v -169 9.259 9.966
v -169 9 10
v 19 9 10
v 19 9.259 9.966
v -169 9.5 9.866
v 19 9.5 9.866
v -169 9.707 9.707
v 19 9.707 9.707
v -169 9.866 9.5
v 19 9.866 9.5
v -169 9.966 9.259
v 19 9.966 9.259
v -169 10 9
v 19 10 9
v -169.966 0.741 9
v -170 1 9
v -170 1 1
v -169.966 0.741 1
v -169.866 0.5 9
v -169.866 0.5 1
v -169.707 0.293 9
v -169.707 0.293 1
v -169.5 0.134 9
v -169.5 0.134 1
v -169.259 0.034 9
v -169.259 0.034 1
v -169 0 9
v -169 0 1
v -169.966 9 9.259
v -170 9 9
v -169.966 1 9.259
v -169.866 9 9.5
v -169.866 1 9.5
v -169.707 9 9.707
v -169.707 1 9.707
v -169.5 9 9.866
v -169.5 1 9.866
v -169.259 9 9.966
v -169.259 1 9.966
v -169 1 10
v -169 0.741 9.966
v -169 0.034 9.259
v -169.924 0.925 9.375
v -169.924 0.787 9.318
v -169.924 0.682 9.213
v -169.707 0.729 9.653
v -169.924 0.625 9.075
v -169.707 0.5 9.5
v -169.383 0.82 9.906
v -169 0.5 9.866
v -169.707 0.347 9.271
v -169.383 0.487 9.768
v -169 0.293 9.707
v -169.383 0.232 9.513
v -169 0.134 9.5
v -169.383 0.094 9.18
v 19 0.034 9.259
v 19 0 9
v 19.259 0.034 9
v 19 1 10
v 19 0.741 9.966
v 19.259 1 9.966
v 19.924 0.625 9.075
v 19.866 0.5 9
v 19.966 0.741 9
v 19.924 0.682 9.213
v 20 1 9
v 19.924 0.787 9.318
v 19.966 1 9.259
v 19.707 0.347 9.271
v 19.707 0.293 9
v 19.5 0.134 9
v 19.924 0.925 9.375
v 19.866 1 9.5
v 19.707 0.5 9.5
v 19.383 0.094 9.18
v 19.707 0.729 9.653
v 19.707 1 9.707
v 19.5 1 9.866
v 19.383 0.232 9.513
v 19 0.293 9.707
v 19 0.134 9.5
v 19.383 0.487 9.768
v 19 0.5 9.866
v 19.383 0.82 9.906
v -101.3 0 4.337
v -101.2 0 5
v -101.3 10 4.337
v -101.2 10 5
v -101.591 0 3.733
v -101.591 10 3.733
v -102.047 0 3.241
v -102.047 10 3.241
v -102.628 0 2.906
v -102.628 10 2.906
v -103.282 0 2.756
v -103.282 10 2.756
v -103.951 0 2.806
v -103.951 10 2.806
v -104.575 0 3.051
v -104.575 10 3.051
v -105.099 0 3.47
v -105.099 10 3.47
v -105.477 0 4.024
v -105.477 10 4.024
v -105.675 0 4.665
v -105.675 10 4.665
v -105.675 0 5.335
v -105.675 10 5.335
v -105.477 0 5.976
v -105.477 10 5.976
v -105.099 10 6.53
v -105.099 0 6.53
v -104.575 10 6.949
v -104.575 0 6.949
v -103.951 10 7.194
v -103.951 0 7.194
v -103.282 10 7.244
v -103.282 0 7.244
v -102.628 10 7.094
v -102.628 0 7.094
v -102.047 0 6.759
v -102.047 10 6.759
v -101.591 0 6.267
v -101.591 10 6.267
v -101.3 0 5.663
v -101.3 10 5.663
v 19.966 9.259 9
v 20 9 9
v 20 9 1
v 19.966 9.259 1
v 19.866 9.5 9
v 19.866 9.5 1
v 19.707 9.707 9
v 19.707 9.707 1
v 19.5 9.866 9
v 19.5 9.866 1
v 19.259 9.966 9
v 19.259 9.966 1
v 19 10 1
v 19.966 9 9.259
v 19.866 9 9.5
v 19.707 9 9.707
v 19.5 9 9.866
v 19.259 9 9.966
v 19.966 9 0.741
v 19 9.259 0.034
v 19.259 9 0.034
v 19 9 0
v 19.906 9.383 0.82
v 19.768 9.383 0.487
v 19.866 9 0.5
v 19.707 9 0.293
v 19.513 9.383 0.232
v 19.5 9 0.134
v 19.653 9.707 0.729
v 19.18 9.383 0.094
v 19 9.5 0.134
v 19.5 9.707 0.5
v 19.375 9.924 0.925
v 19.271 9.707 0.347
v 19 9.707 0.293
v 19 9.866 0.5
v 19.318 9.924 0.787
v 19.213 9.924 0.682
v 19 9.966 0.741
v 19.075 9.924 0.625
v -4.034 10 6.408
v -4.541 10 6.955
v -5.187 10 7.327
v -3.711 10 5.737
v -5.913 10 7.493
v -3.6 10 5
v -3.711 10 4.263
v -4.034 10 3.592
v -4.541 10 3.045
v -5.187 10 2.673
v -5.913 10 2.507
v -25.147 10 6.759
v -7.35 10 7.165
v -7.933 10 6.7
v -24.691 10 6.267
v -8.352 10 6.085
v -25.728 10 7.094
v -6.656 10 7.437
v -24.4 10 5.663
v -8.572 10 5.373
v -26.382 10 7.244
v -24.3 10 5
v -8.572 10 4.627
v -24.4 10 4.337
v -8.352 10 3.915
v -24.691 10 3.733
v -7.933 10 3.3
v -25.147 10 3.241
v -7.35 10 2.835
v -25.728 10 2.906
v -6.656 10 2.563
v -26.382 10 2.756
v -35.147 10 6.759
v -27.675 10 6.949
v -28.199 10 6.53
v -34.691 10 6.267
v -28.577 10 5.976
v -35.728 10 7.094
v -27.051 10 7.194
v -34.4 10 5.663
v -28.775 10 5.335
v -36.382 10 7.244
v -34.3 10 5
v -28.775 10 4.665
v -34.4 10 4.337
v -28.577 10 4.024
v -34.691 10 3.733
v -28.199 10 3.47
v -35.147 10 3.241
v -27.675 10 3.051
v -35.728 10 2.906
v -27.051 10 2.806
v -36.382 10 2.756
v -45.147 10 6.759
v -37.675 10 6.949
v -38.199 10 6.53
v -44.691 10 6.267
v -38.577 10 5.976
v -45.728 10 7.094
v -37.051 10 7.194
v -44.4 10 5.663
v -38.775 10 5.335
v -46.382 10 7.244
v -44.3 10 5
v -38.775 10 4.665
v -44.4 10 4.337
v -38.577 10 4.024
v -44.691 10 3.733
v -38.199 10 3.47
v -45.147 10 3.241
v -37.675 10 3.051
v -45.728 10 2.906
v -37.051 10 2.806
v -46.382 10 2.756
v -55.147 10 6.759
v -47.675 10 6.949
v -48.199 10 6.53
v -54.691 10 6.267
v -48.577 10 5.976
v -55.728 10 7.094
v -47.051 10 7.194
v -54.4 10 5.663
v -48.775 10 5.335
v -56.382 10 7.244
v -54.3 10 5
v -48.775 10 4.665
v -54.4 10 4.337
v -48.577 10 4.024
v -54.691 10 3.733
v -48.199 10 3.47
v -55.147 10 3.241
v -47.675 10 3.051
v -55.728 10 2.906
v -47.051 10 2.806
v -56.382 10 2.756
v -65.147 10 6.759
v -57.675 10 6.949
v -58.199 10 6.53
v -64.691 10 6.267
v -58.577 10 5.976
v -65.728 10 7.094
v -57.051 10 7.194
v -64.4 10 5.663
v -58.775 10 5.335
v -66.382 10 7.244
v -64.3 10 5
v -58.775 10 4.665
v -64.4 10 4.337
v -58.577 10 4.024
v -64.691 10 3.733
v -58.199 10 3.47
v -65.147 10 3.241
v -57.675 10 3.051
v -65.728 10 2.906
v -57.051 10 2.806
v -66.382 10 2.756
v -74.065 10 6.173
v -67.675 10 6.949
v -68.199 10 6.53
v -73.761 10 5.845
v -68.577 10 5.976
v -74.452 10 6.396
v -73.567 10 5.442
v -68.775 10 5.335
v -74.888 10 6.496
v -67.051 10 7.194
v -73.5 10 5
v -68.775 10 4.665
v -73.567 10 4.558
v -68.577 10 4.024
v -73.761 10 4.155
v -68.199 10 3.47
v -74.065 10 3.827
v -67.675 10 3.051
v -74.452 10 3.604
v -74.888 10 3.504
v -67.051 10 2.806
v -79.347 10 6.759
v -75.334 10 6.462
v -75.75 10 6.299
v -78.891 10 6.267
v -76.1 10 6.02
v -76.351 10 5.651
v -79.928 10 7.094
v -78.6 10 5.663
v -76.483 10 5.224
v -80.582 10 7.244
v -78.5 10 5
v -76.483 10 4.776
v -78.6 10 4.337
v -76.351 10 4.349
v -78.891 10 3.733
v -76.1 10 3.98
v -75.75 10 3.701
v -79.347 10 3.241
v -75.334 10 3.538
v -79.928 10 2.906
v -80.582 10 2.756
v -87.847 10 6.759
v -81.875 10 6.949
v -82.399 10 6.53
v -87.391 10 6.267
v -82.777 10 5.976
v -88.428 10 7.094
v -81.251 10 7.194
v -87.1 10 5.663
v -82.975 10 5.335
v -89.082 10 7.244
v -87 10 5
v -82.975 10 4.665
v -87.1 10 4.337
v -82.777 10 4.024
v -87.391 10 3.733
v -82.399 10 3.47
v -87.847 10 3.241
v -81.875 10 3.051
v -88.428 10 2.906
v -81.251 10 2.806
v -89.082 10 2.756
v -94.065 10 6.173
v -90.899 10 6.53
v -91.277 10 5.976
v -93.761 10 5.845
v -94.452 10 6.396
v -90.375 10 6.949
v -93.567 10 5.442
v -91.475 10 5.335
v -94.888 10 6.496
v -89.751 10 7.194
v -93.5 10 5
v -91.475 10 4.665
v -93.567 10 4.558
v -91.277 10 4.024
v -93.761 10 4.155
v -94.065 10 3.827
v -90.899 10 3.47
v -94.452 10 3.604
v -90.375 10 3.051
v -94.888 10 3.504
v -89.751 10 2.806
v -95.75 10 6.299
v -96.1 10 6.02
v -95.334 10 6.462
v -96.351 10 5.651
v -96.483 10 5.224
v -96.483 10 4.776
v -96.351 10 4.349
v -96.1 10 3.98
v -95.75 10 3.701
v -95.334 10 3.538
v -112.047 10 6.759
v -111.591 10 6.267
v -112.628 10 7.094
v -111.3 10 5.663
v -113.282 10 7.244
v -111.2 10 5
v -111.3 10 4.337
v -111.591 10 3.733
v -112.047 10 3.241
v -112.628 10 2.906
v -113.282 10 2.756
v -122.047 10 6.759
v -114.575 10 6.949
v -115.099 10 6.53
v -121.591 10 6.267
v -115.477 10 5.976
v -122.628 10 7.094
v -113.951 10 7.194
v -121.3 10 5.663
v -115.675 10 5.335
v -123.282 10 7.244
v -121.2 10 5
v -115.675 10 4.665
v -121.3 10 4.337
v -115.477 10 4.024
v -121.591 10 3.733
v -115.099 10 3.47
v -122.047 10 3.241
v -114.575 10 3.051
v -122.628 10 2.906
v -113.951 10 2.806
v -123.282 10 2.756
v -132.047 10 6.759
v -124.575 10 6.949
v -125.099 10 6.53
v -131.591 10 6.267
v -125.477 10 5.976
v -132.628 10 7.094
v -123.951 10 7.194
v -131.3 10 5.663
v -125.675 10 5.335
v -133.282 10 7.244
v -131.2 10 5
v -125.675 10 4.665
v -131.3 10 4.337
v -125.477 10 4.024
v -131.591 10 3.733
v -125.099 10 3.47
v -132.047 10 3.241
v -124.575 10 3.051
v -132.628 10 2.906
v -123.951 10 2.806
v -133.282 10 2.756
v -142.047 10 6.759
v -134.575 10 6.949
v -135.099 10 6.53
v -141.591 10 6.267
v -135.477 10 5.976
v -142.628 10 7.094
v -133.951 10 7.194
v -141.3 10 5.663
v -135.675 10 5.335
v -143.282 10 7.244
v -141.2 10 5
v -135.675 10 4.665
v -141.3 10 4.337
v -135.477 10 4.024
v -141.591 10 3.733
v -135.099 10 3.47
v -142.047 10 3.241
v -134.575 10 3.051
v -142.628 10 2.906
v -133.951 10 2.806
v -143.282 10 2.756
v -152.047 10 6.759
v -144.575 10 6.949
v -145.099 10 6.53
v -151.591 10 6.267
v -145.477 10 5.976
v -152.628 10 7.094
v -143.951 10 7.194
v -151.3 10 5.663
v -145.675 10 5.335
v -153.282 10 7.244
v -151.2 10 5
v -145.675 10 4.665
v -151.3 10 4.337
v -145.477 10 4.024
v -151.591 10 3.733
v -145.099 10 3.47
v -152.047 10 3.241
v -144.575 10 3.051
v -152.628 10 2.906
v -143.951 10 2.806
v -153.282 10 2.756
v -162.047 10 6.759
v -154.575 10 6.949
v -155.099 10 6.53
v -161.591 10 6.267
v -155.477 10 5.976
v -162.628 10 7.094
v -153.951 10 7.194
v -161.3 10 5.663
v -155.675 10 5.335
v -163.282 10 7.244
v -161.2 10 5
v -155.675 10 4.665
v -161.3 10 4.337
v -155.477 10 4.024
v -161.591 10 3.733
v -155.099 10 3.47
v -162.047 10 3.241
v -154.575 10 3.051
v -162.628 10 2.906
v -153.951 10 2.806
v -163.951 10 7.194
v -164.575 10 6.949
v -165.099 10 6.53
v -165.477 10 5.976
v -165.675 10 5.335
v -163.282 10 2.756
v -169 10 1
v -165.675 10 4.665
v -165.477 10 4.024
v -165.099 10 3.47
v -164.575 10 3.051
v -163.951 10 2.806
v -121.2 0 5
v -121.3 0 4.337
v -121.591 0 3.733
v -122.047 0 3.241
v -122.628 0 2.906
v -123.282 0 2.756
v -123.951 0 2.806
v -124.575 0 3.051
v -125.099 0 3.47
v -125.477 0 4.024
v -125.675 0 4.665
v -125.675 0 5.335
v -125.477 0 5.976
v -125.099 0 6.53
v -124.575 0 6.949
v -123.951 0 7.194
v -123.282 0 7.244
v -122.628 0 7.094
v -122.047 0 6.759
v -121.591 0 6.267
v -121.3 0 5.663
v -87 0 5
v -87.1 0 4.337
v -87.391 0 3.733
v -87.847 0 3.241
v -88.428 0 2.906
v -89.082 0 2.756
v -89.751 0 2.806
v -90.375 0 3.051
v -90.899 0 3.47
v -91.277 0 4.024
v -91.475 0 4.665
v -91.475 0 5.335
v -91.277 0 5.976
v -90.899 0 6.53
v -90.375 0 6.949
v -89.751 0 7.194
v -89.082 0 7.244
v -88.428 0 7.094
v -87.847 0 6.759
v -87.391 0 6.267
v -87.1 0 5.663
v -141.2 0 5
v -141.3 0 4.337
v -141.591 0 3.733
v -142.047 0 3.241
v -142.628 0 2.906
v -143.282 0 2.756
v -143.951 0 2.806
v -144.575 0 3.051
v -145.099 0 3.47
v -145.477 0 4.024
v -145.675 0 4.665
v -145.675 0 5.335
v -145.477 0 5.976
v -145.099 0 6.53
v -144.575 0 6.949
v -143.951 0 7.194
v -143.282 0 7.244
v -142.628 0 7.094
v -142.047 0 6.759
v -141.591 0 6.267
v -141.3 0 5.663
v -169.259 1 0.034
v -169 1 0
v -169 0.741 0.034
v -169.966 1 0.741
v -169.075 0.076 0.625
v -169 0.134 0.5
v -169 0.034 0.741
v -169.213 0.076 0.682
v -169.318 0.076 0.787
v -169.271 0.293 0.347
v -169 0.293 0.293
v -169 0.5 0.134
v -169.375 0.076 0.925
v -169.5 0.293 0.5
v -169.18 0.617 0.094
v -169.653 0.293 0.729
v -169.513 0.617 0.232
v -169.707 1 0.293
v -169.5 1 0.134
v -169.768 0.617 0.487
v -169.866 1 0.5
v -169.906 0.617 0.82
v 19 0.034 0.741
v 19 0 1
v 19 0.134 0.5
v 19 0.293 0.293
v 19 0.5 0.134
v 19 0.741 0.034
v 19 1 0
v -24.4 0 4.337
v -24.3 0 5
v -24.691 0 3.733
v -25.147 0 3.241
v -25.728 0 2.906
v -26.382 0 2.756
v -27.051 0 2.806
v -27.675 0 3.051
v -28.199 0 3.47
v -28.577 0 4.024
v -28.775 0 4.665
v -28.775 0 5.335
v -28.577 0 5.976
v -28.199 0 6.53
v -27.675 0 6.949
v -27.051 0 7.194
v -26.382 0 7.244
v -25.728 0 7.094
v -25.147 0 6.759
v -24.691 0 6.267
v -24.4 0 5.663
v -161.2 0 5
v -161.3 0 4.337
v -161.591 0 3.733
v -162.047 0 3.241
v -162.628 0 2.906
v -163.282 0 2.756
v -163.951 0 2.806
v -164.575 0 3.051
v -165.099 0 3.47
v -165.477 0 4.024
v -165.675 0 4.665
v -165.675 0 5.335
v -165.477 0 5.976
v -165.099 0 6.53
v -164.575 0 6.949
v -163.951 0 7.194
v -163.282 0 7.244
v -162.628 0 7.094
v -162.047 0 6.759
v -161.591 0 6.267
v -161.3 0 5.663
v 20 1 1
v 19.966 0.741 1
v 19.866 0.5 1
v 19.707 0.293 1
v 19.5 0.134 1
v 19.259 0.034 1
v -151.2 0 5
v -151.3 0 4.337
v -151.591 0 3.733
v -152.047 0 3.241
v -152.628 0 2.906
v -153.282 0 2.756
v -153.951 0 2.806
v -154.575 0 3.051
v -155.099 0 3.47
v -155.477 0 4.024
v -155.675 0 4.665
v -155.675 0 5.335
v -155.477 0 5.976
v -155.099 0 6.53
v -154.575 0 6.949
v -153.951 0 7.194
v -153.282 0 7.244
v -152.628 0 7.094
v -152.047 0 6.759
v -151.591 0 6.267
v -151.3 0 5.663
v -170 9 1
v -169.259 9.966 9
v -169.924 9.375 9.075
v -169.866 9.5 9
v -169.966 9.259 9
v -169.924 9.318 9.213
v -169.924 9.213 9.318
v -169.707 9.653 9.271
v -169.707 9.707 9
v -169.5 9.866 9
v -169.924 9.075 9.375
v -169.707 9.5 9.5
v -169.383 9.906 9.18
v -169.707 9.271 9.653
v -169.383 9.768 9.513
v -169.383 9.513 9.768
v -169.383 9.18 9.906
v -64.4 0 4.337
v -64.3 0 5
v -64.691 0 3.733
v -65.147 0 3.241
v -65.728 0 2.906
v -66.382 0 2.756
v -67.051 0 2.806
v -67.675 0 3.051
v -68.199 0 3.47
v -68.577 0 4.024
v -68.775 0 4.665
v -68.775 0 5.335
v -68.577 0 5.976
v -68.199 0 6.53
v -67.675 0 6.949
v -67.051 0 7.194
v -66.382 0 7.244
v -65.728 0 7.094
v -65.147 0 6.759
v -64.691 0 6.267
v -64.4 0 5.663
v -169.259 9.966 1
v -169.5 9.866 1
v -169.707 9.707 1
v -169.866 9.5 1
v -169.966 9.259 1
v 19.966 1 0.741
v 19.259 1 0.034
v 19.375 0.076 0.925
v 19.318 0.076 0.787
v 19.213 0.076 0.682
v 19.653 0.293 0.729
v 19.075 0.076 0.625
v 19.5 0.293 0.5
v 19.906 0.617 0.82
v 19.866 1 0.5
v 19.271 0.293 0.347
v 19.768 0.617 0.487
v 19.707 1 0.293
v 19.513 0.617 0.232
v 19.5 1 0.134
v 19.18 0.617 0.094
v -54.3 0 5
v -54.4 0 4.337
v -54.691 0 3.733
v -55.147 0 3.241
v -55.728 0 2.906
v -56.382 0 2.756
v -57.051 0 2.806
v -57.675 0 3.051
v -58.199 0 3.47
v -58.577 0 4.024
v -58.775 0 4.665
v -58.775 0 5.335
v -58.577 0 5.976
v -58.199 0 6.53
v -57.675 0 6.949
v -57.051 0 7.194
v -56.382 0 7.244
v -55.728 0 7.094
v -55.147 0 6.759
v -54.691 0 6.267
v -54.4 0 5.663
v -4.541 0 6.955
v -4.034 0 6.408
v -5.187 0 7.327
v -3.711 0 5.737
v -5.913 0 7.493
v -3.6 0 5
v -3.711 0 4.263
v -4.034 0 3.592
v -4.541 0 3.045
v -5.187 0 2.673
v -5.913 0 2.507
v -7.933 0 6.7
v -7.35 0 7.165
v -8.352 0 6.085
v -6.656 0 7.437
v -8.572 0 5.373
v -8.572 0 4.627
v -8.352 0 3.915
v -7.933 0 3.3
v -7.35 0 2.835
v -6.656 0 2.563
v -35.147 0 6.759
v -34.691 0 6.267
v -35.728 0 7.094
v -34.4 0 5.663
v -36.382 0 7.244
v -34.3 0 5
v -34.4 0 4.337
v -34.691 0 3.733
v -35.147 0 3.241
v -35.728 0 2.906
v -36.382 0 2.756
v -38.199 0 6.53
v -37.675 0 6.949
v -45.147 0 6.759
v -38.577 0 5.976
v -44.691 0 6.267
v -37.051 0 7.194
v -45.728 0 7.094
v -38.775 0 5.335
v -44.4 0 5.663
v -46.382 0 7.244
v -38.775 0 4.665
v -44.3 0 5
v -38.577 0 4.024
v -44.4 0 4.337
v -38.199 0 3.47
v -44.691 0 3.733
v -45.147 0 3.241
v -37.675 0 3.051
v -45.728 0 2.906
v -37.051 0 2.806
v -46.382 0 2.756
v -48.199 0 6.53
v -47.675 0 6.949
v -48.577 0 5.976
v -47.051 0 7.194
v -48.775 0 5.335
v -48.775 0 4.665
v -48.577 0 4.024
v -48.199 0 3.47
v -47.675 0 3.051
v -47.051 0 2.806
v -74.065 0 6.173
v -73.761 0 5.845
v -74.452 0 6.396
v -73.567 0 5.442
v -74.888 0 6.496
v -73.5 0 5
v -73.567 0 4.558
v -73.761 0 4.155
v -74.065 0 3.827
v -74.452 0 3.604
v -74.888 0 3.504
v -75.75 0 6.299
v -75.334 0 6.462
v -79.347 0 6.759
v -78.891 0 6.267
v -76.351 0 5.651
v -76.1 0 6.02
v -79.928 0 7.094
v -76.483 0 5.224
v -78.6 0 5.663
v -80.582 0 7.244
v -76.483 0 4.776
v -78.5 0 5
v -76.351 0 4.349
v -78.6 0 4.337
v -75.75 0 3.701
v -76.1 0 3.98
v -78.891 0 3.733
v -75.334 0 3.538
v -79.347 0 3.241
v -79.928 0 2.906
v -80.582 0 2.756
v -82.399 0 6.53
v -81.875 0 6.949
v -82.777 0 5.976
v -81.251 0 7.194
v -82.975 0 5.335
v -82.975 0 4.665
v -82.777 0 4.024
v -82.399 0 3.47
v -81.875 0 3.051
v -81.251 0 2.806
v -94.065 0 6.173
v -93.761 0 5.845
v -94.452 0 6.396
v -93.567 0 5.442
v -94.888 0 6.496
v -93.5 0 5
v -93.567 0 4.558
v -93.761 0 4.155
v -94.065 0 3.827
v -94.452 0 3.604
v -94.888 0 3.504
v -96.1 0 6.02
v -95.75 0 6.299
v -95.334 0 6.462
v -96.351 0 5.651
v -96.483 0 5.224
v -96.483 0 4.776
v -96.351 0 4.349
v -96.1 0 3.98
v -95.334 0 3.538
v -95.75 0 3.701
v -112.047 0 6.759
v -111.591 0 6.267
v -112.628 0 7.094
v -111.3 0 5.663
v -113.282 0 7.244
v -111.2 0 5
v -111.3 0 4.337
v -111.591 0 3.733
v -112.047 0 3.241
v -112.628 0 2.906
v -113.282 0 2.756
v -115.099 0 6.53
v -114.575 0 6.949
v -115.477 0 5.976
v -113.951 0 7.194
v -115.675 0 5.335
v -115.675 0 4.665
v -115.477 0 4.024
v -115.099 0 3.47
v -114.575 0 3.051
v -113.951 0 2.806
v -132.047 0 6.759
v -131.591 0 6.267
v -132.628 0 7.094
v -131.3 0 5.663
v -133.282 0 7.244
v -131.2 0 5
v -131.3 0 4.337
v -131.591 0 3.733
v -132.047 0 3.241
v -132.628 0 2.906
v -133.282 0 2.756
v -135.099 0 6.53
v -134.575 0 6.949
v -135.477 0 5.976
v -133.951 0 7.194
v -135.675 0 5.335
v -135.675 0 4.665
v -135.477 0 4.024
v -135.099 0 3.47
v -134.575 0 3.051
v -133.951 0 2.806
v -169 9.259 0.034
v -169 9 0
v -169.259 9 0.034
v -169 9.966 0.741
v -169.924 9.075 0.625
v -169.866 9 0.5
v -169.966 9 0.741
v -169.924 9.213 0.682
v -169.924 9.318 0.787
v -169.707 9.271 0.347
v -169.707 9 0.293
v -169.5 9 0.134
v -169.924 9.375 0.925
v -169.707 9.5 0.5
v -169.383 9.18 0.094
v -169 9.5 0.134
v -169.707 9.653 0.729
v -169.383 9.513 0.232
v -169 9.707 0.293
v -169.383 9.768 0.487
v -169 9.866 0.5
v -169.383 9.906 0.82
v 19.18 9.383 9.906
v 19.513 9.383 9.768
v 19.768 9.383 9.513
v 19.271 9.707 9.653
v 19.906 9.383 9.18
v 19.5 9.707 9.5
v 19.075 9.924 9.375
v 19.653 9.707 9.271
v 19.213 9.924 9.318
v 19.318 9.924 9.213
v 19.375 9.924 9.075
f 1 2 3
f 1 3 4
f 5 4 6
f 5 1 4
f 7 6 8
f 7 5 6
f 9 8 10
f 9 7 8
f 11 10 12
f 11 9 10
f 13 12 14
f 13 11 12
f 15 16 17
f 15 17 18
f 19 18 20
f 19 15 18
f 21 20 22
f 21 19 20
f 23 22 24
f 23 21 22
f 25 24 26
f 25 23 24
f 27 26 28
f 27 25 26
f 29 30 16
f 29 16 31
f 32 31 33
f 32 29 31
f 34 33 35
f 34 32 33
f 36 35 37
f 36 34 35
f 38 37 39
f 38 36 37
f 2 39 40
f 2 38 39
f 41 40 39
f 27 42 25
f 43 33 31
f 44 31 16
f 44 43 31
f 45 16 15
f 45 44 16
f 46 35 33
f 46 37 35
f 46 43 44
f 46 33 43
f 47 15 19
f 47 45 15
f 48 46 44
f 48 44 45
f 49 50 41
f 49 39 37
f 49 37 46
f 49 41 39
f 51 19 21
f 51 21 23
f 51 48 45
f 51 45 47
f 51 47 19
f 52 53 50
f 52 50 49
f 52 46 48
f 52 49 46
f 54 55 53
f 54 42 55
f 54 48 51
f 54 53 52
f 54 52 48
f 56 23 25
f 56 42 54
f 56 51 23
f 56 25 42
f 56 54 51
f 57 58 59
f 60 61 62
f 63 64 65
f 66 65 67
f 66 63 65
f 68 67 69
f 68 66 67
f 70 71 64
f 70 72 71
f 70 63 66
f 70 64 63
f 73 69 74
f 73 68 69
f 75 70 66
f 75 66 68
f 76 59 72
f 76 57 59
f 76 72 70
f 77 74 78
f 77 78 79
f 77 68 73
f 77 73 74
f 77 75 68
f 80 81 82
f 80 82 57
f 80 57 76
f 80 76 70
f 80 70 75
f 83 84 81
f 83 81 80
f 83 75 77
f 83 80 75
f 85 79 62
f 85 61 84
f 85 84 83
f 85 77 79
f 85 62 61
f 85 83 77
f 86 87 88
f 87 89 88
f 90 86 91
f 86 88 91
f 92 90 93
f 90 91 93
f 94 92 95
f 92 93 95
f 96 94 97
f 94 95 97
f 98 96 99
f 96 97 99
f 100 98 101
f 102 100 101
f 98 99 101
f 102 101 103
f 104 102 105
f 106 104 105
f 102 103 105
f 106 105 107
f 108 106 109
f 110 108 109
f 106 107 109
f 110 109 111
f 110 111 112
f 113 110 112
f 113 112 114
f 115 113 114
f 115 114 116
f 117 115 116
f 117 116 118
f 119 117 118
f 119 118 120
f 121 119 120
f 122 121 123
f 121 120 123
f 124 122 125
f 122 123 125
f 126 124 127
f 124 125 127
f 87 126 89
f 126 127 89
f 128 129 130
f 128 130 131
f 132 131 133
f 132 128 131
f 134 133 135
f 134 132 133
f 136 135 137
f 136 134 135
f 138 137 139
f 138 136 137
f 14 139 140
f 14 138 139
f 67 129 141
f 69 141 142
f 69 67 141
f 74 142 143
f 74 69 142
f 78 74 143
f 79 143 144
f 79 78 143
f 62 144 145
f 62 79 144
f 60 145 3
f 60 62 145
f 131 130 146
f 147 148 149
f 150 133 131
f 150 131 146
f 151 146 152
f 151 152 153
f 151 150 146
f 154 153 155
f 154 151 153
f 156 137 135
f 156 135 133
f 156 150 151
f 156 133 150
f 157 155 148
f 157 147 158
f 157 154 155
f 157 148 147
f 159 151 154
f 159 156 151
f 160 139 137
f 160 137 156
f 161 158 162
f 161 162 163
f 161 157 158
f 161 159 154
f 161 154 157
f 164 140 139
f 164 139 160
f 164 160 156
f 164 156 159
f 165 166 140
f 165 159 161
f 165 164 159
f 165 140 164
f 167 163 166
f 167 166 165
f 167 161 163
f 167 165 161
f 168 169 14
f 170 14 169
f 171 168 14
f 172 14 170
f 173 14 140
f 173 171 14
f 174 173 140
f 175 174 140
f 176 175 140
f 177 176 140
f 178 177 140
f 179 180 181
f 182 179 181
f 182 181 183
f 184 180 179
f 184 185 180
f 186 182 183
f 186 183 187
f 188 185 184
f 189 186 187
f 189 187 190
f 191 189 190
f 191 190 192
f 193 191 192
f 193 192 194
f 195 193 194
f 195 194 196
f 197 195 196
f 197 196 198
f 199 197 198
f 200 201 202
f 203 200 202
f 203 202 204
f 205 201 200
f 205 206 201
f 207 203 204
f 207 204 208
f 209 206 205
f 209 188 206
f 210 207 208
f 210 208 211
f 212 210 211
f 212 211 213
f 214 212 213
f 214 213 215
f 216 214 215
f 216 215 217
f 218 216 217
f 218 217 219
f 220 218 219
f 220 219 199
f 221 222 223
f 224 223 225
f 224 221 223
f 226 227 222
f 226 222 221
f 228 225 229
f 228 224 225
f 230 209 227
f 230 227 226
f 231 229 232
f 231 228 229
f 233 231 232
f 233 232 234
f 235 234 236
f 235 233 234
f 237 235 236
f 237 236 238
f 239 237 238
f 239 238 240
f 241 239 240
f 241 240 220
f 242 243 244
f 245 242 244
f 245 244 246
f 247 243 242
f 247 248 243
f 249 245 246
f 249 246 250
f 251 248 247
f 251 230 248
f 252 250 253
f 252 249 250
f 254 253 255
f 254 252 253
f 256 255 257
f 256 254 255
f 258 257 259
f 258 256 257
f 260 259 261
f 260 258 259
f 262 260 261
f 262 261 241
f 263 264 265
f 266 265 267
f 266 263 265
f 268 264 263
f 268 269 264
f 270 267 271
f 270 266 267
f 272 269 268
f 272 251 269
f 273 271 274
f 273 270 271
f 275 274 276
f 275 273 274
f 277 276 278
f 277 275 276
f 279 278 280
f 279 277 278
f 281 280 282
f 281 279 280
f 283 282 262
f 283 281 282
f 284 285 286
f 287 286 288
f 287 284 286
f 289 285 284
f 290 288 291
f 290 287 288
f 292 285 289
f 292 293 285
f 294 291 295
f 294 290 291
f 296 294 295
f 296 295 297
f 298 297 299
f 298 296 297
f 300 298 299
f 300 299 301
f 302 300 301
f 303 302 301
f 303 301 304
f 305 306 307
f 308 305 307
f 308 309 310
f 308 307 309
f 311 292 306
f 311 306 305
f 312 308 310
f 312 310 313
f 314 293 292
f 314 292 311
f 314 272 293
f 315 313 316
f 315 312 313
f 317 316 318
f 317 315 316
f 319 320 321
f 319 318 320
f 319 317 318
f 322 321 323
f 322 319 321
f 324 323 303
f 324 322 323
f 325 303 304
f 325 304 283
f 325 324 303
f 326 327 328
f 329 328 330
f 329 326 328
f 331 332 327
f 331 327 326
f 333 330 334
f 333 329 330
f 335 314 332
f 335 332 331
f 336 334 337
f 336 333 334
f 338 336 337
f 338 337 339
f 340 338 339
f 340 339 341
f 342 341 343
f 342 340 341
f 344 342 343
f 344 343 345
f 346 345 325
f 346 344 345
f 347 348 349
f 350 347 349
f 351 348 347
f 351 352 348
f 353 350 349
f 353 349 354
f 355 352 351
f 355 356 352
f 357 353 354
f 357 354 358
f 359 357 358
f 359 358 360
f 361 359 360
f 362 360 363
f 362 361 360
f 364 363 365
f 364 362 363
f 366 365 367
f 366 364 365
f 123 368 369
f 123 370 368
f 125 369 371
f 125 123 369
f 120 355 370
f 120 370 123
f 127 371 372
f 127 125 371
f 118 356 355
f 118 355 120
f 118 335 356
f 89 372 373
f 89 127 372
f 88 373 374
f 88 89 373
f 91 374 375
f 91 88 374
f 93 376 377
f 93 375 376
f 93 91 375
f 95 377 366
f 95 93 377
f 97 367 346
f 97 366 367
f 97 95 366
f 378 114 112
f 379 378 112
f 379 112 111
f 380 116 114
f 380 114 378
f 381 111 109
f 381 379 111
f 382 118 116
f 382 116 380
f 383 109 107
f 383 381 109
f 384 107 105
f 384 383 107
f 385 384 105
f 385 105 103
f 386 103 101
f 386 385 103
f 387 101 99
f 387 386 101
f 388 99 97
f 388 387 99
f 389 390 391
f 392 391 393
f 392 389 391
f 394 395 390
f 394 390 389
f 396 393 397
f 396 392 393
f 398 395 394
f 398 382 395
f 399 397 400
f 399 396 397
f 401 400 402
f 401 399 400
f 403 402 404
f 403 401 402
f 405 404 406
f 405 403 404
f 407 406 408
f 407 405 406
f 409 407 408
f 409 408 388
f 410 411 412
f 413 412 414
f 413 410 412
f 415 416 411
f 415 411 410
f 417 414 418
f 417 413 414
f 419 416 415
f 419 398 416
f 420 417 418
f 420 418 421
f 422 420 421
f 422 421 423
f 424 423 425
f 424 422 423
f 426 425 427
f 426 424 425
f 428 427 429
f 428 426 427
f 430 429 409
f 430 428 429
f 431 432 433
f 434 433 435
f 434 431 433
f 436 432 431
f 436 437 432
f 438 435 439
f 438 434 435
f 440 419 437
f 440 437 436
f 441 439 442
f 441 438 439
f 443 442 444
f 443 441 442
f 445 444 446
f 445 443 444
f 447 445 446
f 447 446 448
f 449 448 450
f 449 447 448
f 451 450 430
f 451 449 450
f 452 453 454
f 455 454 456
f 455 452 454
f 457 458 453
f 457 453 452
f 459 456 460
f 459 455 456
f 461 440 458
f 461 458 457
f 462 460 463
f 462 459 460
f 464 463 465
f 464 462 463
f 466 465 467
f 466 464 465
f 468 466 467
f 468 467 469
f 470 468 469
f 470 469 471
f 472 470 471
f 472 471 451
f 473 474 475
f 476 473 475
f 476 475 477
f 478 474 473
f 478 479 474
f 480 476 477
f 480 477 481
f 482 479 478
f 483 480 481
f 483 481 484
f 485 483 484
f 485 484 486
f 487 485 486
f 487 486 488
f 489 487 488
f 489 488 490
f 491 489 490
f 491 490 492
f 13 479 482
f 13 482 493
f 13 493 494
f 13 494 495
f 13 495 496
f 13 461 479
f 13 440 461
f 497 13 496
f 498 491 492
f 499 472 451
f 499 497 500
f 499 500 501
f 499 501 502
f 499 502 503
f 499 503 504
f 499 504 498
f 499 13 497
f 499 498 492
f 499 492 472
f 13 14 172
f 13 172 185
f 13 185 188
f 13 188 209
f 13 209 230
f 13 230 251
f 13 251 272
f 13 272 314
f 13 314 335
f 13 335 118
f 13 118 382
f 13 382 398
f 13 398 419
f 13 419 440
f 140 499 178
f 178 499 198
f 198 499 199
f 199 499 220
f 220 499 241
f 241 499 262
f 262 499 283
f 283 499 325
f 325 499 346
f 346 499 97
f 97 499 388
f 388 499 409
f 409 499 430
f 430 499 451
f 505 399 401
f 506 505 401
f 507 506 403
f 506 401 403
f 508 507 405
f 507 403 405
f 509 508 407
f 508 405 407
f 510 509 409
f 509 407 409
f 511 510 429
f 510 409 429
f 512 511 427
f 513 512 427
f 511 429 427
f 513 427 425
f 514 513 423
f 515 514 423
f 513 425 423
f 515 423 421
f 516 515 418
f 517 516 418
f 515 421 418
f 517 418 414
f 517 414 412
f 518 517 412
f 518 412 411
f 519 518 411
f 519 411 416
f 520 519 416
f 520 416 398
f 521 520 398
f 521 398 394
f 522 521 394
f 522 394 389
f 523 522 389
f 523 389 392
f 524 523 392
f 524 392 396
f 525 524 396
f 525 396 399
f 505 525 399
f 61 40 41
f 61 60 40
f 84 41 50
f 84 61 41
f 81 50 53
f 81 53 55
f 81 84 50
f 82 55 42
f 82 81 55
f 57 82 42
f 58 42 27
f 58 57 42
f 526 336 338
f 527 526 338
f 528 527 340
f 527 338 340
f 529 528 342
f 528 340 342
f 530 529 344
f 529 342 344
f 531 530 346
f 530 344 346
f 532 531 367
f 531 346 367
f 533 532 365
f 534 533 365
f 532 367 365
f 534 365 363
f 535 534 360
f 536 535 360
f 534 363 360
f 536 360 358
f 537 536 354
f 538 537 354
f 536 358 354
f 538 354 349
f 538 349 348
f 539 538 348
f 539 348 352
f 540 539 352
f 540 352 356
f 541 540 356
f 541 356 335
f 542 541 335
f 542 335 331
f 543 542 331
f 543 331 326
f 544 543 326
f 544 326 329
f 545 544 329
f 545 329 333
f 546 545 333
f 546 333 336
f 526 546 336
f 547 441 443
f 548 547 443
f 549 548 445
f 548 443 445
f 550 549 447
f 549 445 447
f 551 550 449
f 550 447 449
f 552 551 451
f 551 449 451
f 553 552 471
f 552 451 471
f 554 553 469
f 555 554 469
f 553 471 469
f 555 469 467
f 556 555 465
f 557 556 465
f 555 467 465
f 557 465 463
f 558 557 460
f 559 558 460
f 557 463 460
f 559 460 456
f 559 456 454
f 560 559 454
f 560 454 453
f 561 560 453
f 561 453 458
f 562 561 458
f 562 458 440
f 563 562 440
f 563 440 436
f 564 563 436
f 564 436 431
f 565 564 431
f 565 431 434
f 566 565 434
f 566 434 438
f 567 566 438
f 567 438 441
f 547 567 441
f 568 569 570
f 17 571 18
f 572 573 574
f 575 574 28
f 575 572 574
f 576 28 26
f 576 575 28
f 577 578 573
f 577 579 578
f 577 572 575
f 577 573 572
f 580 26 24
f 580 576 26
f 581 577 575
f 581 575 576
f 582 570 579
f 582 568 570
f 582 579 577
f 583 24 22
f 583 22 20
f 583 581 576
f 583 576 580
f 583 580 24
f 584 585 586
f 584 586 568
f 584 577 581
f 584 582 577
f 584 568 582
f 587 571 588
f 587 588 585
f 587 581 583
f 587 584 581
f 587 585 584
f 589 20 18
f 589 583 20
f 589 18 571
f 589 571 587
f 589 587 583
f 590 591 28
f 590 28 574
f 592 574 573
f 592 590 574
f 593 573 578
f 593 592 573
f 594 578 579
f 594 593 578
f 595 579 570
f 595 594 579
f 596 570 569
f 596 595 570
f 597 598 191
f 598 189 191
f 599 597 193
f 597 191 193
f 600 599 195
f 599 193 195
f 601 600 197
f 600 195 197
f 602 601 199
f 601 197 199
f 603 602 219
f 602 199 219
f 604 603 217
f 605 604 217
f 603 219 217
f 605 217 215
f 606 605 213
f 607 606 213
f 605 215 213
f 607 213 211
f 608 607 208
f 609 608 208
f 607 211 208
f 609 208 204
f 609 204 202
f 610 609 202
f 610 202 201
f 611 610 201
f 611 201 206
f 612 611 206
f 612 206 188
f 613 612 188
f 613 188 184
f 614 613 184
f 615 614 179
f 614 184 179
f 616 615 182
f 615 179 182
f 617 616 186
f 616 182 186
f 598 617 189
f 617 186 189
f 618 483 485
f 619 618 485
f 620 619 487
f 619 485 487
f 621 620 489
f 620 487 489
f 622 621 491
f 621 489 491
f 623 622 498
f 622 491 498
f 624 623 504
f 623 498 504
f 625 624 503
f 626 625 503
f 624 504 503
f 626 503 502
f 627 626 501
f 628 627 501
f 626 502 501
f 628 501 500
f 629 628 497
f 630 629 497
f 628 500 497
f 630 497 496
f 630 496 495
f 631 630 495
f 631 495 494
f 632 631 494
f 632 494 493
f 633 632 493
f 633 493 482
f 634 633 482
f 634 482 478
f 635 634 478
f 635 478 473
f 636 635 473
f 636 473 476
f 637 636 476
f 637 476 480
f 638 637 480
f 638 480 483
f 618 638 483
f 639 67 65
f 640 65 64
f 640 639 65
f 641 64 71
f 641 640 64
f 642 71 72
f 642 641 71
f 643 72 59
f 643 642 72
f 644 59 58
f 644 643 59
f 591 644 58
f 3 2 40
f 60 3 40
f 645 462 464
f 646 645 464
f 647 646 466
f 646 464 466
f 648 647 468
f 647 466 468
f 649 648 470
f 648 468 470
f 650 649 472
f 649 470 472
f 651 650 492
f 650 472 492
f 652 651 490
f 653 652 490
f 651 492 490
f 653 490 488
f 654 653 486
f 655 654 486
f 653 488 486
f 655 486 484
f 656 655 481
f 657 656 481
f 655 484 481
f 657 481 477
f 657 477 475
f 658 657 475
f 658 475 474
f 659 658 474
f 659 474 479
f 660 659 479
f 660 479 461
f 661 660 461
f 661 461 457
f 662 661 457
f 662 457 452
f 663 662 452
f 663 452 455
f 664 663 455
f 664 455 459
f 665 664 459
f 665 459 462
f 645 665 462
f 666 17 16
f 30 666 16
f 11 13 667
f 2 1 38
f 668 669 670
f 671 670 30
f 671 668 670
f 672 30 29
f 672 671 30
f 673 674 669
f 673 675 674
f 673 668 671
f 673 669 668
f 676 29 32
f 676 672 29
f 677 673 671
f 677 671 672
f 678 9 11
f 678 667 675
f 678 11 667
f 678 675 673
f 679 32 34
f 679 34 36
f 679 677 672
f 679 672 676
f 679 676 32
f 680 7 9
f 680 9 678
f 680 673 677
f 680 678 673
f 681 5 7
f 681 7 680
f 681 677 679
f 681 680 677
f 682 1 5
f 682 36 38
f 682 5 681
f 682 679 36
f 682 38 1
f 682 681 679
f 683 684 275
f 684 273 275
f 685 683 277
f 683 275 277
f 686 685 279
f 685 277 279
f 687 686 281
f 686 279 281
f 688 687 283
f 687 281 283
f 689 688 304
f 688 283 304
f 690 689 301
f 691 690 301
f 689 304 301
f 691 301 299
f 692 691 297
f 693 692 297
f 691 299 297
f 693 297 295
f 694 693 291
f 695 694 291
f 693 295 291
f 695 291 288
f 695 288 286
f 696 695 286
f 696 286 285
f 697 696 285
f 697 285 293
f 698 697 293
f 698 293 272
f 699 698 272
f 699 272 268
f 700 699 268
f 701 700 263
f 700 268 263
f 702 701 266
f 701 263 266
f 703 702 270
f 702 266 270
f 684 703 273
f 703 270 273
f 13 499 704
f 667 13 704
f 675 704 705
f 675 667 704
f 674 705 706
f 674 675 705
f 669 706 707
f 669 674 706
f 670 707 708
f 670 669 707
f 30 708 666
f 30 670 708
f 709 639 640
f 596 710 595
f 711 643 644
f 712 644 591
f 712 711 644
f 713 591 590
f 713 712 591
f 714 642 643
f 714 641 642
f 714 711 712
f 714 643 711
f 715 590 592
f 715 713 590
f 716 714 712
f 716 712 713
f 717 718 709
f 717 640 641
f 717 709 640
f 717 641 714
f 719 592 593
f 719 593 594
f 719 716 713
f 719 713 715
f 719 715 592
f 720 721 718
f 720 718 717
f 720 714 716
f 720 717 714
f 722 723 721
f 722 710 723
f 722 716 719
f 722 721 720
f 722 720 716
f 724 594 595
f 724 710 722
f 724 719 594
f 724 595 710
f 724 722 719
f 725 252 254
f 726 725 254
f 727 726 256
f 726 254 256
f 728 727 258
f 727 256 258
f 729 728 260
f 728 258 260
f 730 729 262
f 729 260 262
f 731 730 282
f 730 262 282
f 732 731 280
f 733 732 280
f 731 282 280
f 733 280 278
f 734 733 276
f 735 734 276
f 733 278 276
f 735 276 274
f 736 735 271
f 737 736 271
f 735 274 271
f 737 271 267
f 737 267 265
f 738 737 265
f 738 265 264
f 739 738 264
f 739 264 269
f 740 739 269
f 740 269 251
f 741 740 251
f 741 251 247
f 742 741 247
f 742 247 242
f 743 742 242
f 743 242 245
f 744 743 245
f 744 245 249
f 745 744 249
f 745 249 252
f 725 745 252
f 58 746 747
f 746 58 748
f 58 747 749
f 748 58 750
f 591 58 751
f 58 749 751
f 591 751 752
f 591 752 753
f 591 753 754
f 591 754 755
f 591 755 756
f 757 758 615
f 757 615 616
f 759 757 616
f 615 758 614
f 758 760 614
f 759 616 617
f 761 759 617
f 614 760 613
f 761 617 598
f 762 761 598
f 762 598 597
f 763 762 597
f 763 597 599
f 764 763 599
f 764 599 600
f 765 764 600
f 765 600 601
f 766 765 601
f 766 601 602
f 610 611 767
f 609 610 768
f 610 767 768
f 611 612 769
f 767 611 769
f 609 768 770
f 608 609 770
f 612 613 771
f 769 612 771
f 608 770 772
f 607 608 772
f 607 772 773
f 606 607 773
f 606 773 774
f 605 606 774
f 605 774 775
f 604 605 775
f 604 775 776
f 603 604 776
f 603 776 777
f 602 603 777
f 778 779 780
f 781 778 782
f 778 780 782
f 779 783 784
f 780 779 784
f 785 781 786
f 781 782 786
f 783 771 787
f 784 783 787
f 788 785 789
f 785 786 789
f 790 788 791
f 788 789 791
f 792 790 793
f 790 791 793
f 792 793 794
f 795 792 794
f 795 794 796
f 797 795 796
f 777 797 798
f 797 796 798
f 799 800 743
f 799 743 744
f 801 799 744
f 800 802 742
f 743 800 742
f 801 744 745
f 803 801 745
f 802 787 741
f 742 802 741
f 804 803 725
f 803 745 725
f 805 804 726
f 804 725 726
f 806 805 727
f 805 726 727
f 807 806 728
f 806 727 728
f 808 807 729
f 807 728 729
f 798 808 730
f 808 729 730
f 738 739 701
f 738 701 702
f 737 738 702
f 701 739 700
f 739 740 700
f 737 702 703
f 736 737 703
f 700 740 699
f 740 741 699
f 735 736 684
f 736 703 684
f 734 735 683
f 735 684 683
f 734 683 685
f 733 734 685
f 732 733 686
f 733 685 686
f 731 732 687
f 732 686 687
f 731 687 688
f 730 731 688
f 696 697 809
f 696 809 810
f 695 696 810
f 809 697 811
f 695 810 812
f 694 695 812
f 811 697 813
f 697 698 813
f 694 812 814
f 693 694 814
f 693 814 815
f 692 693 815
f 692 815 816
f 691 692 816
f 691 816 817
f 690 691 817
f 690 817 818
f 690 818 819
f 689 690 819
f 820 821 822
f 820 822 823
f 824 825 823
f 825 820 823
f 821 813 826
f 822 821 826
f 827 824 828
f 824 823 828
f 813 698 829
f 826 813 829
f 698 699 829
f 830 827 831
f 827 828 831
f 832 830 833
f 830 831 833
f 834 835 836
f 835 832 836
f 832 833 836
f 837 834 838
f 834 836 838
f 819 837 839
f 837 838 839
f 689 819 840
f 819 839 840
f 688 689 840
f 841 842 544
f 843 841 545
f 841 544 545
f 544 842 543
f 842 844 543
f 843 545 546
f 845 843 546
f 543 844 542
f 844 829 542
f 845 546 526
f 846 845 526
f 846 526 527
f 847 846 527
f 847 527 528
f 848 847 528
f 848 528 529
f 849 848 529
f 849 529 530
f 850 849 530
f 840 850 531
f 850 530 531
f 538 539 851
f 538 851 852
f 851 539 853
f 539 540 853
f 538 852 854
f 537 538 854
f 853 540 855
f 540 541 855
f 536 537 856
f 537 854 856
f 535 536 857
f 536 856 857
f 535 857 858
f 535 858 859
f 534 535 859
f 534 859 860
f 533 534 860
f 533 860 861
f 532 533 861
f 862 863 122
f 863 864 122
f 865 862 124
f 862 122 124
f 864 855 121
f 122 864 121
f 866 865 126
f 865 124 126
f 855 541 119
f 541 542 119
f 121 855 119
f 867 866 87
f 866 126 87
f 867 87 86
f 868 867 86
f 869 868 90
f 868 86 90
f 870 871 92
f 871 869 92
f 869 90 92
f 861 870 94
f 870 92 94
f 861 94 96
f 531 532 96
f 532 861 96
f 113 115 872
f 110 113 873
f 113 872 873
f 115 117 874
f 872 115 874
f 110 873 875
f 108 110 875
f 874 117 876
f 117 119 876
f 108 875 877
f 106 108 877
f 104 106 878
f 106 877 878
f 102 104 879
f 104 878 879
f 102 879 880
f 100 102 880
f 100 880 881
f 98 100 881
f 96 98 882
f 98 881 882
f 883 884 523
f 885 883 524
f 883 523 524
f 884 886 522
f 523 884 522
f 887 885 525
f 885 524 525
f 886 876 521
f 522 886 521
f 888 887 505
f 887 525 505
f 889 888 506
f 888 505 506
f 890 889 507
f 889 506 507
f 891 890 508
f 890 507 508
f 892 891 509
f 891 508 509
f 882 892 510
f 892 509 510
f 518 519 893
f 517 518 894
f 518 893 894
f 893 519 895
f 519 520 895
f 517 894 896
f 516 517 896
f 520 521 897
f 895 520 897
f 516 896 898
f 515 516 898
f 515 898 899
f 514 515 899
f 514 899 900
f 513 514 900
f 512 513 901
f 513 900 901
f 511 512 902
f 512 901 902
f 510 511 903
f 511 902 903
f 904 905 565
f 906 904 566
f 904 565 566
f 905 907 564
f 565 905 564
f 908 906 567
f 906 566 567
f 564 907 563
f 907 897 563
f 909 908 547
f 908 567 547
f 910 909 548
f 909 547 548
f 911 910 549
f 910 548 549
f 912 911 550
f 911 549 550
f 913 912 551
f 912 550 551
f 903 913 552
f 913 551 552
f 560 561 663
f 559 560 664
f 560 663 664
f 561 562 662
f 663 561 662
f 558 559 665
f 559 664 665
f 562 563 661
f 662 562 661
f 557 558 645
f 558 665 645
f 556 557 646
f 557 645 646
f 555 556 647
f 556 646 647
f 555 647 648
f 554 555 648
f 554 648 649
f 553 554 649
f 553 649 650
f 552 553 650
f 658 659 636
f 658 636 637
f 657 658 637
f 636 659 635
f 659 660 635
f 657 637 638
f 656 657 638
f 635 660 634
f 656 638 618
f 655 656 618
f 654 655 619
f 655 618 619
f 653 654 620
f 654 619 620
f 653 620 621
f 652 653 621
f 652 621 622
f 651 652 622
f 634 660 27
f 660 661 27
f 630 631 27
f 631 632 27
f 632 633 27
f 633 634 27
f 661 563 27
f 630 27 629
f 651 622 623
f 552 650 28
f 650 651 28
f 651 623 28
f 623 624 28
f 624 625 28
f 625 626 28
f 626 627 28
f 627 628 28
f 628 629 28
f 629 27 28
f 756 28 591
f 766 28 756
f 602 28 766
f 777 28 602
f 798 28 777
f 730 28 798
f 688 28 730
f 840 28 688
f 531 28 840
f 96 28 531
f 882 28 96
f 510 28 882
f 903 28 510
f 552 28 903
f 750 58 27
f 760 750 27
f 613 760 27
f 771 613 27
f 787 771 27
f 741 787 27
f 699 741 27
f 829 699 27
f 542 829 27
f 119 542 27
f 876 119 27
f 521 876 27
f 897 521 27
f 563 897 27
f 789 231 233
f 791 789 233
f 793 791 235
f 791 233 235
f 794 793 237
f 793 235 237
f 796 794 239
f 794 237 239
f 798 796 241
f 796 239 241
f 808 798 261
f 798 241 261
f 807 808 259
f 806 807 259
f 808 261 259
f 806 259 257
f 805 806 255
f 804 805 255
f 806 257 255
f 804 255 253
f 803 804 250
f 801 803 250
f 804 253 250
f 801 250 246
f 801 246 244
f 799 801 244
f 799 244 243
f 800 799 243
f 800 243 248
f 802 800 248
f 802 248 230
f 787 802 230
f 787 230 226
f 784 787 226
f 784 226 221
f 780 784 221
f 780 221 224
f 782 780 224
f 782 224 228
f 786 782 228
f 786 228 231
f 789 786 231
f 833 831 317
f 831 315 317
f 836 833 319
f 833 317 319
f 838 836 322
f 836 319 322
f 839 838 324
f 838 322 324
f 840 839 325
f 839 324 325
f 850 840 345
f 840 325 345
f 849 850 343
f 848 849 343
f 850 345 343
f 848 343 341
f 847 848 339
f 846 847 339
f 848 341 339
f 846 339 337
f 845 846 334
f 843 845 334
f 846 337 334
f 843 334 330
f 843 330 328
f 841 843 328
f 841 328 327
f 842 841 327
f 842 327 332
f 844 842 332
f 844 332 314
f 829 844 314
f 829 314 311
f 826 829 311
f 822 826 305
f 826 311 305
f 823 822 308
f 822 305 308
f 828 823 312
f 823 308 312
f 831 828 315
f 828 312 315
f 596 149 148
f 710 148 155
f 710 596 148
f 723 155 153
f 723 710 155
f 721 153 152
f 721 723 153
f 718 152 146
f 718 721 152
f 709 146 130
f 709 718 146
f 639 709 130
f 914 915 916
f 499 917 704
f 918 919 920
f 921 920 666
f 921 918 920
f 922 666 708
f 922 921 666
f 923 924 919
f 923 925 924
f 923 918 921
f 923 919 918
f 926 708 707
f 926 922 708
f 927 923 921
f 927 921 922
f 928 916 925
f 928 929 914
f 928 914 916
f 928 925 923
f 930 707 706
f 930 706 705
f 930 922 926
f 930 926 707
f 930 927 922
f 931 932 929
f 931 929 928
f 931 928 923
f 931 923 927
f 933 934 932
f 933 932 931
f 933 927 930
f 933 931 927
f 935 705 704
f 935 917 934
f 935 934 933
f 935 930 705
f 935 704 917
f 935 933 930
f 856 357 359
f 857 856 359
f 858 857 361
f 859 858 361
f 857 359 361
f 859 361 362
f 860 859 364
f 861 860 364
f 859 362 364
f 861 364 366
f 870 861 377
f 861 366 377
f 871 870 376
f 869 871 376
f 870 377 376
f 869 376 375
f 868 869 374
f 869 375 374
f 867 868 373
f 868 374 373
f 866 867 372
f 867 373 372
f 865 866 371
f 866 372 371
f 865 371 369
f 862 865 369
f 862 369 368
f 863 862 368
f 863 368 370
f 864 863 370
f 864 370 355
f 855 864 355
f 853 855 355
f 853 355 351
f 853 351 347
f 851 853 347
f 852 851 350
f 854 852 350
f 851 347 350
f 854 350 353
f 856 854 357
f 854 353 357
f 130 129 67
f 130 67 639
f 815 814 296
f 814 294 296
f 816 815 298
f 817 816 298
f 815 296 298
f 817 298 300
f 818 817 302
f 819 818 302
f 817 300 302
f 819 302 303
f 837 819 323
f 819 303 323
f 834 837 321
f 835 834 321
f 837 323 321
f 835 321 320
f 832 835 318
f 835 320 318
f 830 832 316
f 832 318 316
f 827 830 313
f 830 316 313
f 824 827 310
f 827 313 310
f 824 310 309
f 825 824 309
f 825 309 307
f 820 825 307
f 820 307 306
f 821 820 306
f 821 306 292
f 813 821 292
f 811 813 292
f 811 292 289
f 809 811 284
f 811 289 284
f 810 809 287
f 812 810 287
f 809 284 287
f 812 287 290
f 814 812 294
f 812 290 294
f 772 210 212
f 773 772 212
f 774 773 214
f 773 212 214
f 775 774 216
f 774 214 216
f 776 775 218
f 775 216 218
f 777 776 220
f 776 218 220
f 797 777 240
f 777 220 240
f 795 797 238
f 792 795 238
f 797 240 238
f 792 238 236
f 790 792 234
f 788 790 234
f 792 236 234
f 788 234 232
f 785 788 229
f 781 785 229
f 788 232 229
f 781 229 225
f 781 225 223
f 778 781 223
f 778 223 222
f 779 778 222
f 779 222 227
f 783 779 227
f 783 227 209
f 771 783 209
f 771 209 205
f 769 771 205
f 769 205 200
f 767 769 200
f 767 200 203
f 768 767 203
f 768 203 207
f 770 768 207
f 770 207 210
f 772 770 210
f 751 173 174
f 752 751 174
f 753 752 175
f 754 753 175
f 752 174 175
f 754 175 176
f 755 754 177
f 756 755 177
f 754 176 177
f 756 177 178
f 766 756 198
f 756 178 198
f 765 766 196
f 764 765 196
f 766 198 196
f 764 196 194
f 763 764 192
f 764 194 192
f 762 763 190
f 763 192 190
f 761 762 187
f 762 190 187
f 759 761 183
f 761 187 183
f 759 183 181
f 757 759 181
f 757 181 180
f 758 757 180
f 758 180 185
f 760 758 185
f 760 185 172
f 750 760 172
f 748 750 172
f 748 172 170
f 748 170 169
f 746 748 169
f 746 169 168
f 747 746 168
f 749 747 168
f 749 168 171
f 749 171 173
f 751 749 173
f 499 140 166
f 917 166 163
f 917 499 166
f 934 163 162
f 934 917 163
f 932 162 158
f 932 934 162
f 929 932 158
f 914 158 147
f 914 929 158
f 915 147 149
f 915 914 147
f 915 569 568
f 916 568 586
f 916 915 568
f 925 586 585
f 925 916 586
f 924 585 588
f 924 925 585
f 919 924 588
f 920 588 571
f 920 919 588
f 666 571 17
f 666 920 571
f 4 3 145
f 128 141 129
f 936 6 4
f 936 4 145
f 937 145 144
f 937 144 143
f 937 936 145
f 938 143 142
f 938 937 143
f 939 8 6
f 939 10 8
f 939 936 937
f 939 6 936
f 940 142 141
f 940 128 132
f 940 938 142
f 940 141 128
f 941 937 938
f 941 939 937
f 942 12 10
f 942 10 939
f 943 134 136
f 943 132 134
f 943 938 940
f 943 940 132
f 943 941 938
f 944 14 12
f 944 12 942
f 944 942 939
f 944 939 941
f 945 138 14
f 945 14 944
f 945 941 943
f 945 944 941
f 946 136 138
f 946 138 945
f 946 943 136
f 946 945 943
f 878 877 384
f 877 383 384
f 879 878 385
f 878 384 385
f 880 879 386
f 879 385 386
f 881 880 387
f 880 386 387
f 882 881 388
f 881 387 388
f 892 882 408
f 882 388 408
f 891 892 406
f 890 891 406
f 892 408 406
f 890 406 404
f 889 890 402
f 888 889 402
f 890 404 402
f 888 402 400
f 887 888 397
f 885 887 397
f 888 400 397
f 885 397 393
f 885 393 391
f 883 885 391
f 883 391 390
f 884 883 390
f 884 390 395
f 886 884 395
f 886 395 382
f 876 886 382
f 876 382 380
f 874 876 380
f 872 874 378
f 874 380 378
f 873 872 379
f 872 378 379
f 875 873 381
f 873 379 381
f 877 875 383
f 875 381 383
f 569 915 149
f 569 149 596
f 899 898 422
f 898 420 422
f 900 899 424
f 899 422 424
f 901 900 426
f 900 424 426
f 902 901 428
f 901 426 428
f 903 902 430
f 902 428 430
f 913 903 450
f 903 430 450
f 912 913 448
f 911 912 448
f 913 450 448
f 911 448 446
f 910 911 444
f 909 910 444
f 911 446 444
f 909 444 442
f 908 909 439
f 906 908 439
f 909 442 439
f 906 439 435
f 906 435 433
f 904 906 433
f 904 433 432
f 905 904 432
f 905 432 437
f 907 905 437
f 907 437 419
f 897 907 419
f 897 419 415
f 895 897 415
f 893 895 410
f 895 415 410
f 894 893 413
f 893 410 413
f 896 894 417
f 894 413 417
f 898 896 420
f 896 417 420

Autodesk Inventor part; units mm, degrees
ref_plane "YZ Plane" through (0, 0, 0) normal (1, 0, 0) x (0, 1, 0)
ref_plane "XZ Plane" through (0, 0, 0) normal (0, 1, 0) x (-1, 0, 0)
ref_plane "XY Plane" through (0, 0, 0) normal (0, 0, 1) x (1, 0, 0)
sketch "Sketch1" plane through (0, 0, 0) normal (0, 1, 0) x (-1, 0, 0)
  line L0 (0, 0) -> (170, 0)
  line L1 (170, 0) -> (170, 10)
  line L2 (170, 10) -> (0, 10)
  line L3 (0, 10) -> (0, 0)
  dimension "d0" = 170
  dimension "d1" = 10
extrude "Extrusion1" add sketch "Sketch1" along normal blind 10
sketch "Sketch2" plane through (0, 10, 0) normal (0, 1, 0) x (1, 0, 0)
  line L0 (0, -10) -> (0, 0) projected
  line L1 (0, -5) -> (-2.2, -5)
  circle A0 centre (-6.1, -5) radius 3.9
  line L2 (0, 0) -> (-170, 0) projected
  line L3 (-170, -10) -> (0, -10) projected
  circle A1 centre (-75, -5) radius 1.5
  circle A2 centre (-95, -5) radius 1.5
  dimension "d4" = 2.2
  dimension "d8" = 3
  dimension "d9" = 3
extrude "Extrusion2" cut sketch "Sketch2" against normal blind 10 contours A1
extrude "Extrusion3" cut sketch "Sketch2" against normal blind 10 contours A2
extrude "Extrusion4" cut sketch "Sketch2" against normal blind 10 contours A0
sketch "Sketch3" plane through (0, 10, 0) normal (0, 1, 0) x (1, 0, 0)
  line L0 (-170, 0) -> (-170, -10) projected
  line L1 (-170, -5) -> (-10, -5)
  circle A0 centre (-6.1, -5) radius 3.9 projected
  line L2 (-165.7, -5) -> (-163.45, -5)
  circle A1 centre (-163.45, -5) radius 2.25
  circle A2 centre (-153.45, -5) radius 2.25
  circle A3 centre (-143.45, -5) radius 2.25
  circle A4 centre (-133.45, -5) radius 2.25
  circle A5 centre (-123.45, -5) radius 2.25
  circle A6 centre (-113.45, -5) radius 2.25
  circle A7 centre (-103.45, -5) radius 2.25
  circle A8 centre (-95, -5) radius 1.5 projected
  line L3 (-93.5, -5) -> (-93.5, -7.9104)
  circle A9 centre (-75, -5) radius 1.5 projected
  line L4 (-76.5, -5) -> (-76.5, -7.25)
  line L5 (-93.5, -5) -> (-76.5, -5)
  line L6 (-85, -5) -> (-93.5, -5)
  line L7 (-85, -5) -> (-76.5, -5)
  circle A10 centre (-80.75, -5) radius 2.25
  circle A11 centre (-89.25, -5) radius 2.25
  line L8 (-10, -5) -> (-12, -5)
  line L9 (-10, -5) -> (-14.3, -5)
  line L10 (-14.3, -5) -> (-16.55, -5)
  circle A12 centre (-16.55, -5) radius 2.25
  circle A13 centre (-26.55, -5) radius 2.25
  circle A14 centre (-36.55, -5) radius 2.25
  circle A15 centre (-46.55, -5) radius 2.25
  circle A16 centre (-56.55, -5) radius 2.25
  circle A17 centre (-66.55, -5) radius 2.25
  point P0 (0, 0)
  point P1 (-155.7, -5)
  point P2 (-145.7, -5)
  point P3 (-135.7, -5)
  point P4 (-125.7, -5)
  point P5 (-115.7, -5)
  point P6 (-105.7, -5)
  point P7 (-24.3, -5)
  point P8 (-34.3, -5)
  point P9 (-44.3, -5)
  point P10 (-54.3, -5)
  point P11 (-64.3, -5)
  dimension "d20" = 10
  dimension "d32" = 10
extrude "Extrusion5" cut sketch "Sketch3" against normal blind 10 contours A1 L1 | L1 A1 | L1 A12 | L1 A12 | A2 L1 | L1 A2 | A3 L1 | L1 A3 | A4 L1 | L1 A4 | A5 L1 | L1 A5 | A6 L1 | L1 A6 | A7 L1 | L1 A7 | A11 L1 | L1 A11 | A10 L1 | L1 A10 | A17 L1 | L1 A17 | A16 L1 | L1 A16 | A15 L1 | L1 A15 | A14 L1 | L1 A14 | A13 L1 | L1 A13
thread "Thread1" size "M3x0.5" class "6H" standard "ANSI Metric M Profile" full length
thread "Thread2" size "M3x0.5" class "6H" standard "ANSI Metric M Profile" full length
sketch "Sketch4" plane through (0, 10, 0) normal (0, 1, 0) x (1, 0, 0)
  circle A0 centre (-16.55, -5) radius 2.25 projected
  circle A1 centre (-16.55, -5) radius 2.25
  point P0 (0, 0)
extrude "Extrusion6" add sketch "Sketch4" against normal blind 10
sketch "Sketch5" plane through (0, 0, 10) normal (1, 0, 0) x (0, 0, -1)
  line L0 (10, 0) -> (0, 0) projected
  line L1 (0, 0) -> (0, 10) projected
  line L2 (10, 0) -> (0, 0)
  line L3 (0, 0) -> (0, 10)
  line L4 (0, 10) -> (10, 10)
  line L5 (10, 10) -> (10, 0)
extrude "Extrusion7" add sketch "Sketch5" along normal blind 10
sketch "Sketch6" plane through (10, 0, 10) normal (1, 0, 0) x (0, 0, -1)
  line L0 (0, 0) -> (10, 0) projected
  line L1 (0, 10) -> (0, 0) projected
  line L2 (10, 0) -> (0, 0)
  line L3 (0, 0) -> (0, 10)
  line L4 (0, 10) -> (10, 10)
  line L5 (10, 10) -> (10, 0)
extrude "Extrusion8" add sketch "Sketch6" along normal blind 10
sketch "Sketch7" plane through (0, 10, 0) normal (0, 1, 0) x (1, 0, 0)
  point P0 (0, 0)
fillet "Fillet3" radius 1 11 edges at (-75, 10, 10) (-75, 0, 10) (-75, 10, 0) (20, 5, 10) (20, 5, 0) (20, 0, 5) (-170, 10, 5) (-170, 5, 10) (-170, 5, 0) (-170, 0, 5) (-75, 0, 0)
fillet "Fillet4" radius 1 3 edges at (19.7071, 9.7071, 9.7071) (19.7071, 9.7071, 0.2929) (20, 10, 5)
sketch "Sketch8" plane through (19, 1, 0) normal (0, 0, -1) x (-1, 0, 0)
  point P0 (19, -1)
sketch "Sketch9" plane through (0, 10, 0) normal (0, 1, 0) x (1, 0, 0)
  circle A0 centre (-6.1, -5) radius 3.9 projected
  circle A1 centre (-6.1, -5) radius 2.5
  point P0 (0, 0)
  dimension "d53" = 5
extrude "Extrusion9" add sketch "Sketch9" against normal blind 10
properties part number "brazo apoyo"
